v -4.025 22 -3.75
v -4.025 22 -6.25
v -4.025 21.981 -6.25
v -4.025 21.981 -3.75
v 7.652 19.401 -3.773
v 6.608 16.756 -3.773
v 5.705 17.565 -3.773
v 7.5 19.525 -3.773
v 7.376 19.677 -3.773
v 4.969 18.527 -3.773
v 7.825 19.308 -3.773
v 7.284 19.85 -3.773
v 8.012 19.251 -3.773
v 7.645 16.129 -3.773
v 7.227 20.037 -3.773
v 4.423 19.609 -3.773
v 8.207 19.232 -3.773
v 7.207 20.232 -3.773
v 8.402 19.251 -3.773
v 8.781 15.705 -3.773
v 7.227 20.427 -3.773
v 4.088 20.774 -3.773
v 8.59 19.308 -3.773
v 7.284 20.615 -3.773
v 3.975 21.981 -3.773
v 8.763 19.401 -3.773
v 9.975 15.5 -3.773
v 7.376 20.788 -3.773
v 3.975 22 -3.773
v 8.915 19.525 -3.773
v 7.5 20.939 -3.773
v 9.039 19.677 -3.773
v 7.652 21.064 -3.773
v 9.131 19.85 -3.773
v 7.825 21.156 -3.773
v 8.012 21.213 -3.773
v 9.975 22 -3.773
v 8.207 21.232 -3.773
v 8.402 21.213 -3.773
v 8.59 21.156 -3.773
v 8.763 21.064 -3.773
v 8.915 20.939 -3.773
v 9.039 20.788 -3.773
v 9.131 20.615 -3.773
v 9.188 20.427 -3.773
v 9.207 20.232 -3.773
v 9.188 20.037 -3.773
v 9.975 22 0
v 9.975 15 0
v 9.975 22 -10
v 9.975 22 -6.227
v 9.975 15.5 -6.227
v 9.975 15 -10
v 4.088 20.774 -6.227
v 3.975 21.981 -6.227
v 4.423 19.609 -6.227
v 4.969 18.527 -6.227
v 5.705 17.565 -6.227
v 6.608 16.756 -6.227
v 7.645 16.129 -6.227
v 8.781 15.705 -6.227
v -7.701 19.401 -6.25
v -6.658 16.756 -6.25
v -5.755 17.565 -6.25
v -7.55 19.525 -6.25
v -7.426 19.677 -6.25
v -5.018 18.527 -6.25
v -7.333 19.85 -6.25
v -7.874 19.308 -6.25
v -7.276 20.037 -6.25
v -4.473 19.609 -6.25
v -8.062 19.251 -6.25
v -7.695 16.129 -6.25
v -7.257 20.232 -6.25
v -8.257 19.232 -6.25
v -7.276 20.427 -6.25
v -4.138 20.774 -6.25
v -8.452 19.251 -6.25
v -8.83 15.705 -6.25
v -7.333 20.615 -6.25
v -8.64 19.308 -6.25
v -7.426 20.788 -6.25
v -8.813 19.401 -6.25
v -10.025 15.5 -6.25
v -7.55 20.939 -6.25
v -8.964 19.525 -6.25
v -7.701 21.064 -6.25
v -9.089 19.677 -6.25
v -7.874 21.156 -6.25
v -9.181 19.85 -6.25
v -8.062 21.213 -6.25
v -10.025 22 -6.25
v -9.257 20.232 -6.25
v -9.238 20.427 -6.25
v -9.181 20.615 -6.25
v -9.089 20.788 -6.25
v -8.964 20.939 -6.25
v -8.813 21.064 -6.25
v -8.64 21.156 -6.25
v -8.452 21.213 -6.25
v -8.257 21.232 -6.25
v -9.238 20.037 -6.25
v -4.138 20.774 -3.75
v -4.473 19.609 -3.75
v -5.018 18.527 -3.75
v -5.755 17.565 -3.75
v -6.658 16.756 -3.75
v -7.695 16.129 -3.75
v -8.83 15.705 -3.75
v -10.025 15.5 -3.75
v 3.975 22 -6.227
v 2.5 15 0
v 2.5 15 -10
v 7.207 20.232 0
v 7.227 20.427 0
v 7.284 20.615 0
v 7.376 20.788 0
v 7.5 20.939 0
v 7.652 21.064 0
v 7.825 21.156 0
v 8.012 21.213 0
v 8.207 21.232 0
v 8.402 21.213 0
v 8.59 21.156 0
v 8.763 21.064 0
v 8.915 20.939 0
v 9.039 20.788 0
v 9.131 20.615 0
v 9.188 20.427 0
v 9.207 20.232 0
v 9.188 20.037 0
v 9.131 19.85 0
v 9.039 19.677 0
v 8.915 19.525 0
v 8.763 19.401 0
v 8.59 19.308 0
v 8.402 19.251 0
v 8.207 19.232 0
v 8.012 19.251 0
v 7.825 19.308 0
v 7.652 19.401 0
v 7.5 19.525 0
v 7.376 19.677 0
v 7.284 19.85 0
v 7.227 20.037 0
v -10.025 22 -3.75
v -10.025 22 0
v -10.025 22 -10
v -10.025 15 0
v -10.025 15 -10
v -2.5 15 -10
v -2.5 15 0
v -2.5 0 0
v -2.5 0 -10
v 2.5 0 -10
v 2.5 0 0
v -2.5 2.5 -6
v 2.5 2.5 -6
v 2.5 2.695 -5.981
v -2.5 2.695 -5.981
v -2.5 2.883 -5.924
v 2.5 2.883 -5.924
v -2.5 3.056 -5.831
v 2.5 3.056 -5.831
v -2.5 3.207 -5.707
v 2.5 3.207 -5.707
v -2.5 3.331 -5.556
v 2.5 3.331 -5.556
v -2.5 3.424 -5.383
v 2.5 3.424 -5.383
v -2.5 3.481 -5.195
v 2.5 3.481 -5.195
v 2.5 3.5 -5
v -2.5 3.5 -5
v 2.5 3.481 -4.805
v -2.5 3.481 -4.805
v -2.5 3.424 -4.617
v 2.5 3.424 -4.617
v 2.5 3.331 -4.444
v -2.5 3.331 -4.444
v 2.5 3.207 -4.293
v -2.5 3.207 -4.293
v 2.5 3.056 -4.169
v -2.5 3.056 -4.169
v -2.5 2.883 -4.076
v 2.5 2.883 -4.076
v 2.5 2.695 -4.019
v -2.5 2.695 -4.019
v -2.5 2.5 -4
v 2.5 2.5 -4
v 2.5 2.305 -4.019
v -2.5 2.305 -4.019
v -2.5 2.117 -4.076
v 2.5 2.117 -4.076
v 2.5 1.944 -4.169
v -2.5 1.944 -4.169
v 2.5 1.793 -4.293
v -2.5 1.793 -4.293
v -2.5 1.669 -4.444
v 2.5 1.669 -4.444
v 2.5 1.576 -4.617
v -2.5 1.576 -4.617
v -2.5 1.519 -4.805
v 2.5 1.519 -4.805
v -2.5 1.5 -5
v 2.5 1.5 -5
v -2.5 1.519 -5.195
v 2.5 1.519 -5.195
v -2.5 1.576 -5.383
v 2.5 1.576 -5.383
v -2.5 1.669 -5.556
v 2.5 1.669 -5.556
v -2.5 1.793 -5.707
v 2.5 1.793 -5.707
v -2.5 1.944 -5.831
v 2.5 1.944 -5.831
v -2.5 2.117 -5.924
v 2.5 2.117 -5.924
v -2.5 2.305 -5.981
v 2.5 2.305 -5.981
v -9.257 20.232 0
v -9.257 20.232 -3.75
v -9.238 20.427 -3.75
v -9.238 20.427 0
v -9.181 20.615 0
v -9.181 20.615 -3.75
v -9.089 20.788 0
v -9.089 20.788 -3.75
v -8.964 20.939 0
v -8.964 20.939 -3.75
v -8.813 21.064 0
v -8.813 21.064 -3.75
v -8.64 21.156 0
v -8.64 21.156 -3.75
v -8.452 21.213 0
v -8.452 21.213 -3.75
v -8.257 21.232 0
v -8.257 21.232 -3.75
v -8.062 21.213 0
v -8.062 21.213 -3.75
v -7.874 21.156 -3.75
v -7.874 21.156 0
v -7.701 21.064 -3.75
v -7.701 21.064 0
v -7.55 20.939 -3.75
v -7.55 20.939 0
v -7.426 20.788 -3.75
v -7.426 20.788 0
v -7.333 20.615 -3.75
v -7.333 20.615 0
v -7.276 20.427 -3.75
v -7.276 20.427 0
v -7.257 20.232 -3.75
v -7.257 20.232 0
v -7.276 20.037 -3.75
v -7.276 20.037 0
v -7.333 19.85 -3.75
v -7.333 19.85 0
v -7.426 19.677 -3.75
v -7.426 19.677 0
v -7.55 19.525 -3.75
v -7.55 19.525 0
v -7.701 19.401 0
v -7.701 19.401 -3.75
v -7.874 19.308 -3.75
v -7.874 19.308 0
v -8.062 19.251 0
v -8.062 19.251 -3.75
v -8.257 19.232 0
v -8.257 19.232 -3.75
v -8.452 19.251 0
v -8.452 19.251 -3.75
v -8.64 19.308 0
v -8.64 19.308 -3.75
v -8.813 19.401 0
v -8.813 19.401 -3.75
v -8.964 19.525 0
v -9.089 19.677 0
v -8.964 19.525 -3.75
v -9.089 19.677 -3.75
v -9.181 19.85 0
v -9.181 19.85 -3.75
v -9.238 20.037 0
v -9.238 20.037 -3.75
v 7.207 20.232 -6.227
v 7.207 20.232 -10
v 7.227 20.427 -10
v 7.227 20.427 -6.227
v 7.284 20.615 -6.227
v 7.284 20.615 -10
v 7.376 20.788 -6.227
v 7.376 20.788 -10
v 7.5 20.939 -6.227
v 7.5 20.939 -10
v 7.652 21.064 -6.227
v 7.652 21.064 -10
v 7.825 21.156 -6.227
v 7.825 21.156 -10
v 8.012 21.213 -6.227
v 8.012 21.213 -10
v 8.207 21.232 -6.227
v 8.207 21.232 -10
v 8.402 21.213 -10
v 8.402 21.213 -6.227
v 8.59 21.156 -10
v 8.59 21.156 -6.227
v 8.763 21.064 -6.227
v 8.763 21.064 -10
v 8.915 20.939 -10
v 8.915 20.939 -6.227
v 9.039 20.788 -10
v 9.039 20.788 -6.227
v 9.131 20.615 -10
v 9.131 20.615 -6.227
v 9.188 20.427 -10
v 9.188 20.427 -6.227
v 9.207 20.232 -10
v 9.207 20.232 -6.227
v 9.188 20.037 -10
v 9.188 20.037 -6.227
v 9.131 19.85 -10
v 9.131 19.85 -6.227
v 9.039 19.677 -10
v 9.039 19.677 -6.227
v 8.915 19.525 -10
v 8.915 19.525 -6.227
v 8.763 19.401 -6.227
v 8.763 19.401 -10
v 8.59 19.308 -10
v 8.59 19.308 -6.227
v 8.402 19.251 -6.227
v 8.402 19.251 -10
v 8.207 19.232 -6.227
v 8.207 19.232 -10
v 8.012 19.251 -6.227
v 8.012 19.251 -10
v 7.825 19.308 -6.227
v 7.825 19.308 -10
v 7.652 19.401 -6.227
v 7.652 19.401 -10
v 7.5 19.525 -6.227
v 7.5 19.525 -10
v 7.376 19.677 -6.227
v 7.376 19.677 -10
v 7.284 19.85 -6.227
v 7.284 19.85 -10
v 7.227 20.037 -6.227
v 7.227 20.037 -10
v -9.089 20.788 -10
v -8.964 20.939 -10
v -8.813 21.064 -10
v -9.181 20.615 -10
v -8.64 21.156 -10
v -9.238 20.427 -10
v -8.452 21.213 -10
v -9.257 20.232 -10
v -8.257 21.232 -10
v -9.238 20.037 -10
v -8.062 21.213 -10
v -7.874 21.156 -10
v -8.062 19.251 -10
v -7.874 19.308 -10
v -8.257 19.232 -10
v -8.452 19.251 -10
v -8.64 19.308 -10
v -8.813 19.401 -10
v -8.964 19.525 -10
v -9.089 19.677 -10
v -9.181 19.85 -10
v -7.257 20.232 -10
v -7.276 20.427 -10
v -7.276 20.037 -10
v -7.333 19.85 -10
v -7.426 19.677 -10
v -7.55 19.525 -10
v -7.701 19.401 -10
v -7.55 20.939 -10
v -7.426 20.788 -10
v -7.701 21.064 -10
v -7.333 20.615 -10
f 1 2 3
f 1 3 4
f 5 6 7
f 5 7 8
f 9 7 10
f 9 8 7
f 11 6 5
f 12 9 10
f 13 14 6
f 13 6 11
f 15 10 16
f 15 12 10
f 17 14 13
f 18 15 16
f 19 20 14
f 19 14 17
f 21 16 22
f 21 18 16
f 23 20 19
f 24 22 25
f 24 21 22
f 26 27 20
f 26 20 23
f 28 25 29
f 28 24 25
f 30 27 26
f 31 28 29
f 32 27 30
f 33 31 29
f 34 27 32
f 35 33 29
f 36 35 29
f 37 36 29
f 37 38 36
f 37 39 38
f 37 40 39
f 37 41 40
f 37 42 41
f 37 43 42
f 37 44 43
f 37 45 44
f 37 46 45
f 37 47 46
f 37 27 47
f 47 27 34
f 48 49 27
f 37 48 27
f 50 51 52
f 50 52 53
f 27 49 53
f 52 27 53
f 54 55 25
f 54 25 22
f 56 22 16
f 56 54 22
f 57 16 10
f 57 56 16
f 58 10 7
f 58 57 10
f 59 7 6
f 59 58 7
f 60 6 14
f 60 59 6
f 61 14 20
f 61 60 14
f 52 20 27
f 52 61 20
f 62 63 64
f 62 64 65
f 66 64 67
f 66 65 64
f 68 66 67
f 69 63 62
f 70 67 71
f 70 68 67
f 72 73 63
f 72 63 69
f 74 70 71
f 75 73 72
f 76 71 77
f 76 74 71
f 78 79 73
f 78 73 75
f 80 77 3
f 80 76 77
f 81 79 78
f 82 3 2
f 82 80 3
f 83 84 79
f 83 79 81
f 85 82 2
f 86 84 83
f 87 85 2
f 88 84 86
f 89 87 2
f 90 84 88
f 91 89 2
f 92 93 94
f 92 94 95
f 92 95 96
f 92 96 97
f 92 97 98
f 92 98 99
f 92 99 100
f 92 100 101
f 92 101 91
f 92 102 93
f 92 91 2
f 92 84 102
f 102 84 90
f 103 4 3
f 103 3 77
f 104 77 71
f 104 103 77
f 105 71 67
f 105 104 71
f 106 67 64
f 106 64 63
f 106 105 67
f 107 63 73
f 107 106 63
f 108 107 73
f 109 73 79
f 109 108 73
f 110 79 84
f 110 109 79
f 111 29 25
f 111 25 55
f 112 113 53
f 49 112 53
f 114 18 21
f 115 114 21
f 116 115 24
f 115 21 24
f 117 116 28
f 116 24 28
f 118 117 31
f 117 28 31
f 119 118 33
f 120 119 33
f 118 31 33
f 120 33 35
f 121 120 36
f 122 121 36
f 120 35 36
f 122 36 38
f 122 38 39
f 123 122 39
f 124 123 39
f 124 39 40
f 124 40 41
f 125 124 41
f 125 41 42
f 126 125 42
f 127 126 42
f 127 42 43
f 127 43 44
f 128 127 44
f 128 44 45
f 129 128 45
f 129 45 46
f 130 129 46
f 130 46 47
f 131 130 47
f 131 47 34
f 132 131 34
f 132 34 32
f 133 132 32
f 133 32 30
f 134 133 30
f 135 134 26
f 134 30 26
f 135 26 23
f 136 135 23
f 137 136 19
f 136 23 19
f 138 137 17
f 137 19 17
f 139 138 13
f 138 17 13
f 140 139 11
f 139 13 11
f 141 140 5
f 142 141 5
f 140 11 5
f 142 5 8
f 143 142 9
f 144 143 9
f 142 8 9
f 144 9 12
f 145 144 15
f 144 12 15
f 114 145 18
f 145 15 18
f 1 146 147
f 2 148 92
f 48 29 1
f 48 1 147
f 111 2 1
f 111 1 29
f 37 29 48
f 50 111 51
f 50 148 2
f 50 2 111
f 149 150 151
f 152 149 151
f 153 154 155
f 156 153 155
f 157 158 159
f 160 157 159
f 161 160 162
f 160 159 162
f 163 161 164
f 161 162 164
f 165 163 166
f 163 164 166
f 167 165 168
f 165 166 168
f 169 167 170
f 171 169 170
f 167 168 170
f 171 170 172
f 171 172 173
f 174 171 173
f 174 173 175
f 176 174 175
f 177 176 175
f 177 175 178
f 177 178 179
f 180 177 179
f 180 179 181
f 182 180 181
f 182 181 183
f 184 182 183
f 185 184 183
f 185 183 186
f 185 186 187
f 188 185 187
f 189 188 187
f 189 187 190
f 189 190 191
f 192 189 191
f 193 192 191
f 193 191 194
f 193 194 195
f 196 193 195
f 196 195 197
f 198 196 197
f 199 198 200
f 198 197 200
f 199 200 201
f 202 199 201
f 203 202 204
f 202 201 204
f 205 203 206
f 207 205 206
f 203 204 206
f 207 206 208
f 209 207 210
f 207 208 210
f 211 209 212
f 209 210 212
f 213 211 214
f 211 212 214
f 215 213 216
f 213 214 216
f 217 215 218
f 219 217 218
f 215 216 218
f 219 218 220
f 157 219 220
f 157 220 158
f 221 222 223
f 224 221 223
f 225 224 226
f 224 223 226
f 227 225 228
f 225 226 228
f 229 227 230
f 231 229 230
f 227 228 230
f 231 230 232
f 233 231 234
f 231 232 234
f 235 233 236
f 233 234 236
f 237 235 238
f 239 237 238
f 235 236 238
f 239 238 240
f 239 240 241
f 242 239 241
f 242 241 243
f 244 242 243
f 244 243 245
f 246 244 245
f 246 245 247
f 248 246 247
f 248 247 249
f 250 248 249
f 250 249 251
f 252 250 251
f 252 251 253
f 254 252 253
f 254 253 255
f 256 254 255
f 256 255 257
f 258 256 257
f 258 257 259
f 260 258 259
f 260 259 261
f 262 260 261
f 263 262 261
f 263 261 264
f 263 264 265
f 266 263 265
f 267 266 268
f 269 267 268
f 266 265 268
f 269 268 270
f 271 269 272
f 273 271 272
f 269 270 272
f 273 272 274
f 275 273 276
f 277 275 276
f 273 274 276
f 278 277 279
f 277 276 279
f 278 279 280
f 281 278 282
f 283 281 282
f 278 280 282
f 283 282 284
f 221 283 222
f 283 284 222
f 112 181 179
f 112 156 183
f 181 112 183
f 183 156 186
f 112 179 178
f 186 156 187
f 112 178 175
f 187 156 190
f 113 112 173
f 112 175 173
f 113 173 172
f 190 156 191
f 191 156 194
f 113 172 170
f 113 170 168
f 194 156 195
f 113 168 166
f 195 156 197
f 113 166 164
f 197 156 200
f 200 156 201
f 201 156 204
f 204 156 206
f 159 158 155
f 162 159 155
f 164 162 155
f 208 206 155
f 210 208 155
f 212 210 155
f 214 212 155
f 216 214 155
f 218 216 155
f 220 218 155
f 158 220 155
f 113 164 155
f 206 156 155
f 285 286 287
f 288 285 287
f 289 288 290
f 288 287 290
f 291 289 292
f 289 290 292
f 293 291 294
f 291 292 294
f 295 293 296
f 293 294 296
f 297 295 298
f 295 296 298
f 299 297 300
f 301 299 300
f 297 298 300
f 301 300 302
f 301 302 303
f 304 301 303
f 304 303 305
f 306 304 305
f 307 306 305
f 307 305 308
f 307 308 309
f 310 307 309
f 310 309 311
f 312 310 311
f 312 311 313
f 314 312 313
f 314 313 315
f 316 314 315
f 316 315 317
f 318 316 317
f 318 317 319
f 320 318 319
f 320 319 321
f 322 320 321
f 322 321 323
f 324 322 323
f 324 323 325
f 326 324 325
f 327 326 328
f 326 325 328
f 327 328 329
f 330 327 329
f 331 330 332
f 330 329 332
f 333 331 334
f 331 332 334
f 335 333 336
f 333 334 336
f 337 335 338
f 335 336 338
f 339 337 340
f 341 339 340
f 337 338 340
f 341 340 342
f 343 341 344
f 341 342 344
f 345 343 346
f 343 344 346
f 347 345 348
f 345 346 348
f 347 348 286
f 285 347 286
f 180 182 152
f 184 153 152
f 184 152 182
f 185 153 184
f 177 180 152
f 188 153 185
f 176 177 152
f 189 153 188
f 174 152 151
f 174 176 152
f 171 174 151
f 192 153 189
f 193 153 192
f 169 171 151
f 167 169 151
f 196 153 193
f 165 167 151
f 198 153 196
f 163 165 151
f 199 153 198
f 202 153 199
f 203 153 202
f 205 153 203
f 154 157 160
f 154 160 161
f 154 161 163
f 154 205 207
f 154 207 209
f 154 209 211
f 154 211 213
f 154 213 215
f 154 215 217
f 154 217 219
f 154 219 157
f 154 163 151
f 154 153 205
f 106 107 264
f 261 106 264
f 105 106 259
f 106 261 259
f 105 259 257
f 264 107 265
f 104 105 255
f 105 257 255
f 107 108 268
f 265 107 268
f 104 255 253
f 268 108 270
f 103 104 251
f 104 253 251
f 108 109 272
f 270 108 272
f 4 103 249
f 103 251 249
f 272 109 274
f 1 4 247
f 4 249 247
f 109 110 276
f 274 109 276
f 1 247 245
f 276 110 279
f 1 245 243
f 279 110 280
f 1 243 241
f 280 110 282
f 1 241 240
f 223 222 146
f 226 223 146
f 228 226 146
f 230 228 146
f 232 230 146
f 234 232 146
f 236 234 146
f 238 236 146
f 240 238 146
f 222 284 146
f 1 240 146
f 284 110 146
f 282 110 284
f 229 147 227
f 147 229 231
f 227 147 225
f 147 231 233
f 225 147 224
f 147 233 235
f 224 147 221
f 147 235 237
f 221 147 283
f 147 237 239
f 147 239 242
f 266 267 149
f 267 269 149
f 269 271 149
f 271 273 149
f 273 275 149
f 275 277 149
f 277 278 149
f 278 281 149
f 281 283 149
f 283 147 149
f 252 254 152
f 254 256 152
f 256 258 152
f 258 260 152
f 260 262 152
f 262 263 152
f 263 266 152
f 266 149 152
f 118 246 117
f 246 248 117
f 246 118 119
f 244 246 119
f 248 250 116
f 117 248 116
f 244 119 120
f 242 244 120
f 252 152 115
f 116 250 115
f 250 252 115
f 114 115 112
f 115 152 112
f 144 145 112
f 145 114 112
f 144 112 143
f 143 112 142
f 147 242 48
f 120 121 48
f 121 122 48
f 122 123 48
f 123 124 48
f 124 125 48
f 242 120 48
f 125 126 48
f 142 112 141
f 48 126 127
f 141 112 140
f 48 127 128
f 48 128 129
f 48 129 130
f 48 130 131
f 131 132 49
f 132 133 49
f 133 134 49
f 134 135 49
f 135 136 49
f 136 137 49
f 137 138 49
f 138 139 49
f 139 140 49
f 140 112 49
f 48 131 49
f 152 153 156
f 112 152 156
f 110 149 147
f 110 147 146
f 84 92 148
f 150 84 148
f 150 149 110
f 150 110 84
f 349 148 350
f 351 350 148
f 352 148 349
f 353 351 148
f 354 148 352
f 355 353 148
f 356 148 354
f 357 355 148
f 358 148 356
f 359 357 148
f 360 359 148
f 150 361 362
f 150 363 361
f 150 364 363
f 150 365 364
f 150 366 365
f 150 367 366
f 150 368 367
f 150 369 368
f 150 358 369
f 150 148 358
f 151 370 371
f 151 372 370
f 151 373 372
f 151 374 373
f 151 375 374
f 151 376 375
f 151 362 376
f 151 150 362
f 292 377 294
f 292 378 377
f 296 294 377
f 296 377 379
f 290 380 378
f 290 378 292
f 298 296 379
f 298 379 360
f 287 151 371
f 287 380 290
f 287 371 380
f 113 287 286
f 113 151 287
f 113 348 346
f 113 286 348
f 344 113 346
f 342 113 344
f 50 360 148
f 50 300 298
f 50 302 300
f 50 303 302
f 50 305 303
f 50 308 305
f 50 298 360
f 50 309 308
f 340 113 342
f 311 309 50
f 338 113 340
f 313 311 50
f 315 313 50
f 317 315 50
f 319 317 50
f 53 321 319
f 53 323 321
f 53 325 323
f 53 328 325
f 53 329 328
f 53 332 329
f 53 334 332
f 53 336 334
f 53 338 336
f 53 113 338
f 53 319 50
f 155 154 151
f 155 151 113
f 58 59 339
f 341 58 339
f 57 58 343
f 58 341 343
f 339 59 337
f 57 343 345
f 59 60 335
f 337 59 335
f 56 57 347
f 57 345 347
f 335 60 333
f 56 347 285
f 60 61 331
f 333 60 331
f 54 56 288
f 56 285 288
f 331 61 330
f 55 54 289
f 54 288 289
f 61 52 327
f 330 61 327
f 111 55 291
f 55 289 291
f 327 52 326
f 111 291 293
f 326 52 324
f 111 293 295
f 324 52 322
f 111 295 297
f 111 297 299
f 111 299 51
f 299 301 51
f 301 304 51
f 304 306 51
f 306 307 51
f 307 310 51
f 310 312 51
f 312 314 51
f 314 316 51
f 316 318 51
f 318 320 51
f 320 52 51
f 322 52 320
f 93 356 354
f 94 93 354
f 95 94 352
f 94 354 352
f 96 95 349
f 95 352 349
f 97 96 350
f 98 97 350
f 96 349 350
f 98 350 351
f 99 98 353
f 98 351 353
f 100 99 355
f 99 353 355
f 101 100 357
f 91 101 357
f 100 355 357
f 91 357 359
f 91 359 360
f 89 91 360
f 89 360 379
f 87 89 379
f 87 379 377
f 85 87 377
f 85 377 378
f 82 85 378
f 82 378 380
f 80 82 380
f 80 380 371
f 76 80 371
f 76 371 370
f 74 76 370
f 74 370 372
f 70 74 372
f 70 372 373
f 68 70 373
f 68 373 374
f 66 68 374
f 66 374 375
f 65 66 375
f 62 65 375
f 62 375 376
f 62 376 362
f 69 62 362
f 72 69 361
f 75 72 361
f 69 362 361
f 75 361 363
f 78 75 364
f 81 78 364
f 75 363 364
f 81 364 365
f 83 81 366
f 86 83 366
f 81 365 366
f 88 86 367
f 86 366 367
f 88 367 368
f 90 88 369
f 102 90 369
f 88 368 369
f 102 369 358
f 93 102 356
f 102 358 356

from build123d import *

# Parameters (mm, degrees)
CROQUIS2_W              = 5
CROQUIS2_H              = 10
SALIENTE_EXTRUIR1_DEPTH = 15
CROQUIS3_R              = 1
CORTAR_EXTRUIR1_DEPTH   = 19.708286934
CROQUIS4_W              = 20
CROQUIS4_H              = 10
SALIENTE_EXTRUIR2_DEPTH = 7
CROQUIS5_W              = 2.5
CROQUIS5_H              = 6.5
CORTAR_EXTRUIR2_DEPTH   = 6
CROQUIS6_R              = 1
CORTAR_EXTRUIR3_DEPTH   = 27.162895312
CROQUIS7_W              = 2.453318502
CROQUIS7_H              = 6.5
CORTAR_EXTRUIR4_DEPTH   = 6
CROQUIS8_R              = 1
CORTAR_EXTRUIR5_DEPTH   = 27.162895312
REDONDEO1_R             = 6.5


with BuildPart() as part:
    # Croquis2 → Saliente-Extruir1 (new body)
    with BuildSketch(Plane(origin=(0, 0, 0), x_dir=(1, 0, 0), z_dir=(0, 1, 0))):
        with Locations((0, 5)):
            Rectangle(CROQUIS2_W, CROQUIS2_H)
    extrude(amount=SALIENTE_EXTRUIR1_DEPTH)

    # Croquis3 → Cortar-Extruir1 (cut, through all)
    with BuildSketch(Plane(origin=(2.5, 0, 0), x_dir=(0, 0, -1), z_dir=(1, 0, 0))):
        with Locations((5, 2.5)):
            Circle(CROQUIS3_R)
    extrude(amount=-CORTAR_EXTRUIR1_DEPTH, mode=Mode.SUBTRACT)

    # Croquis4 → Saliente-Extruir2 (add)
    with BuildSketch(Plane(origin=(0, 15, 0), x_dir=(1, 0, 0), z_dir=(0, 1, 0))):
        with Locations((-0.024823745, 5)):
            Rectangle(CROQUIS4_W, CROQUIS4_H)
    extrude(amount=SALIENTE_EXTRUIR2_DEPTH)

    # Croquis5 → Cortar-Extruir2 (cut)
    with BuildSketch(Plane.ZY.offset(10.024823745)):
        with Locations((-5, 18.75)):
            Rectangle(CROQUIS5_W, CROQUIS5_H)
    extrude(amount=-CORTAR_EXTRUIR2_DEPTH, mode=Mode.SUBTRACT)

    # Croquis6 → Cortar-Extruir3 (cut, through all)
    with BuildSketch(Plane(origin=(0, 0, -10), x_dir=(-1, 0, 0), z_dir=(0, 0, -1))):
        with Locations((8.257056792, 20.232233047)):
            Circle(CROQUIS6_R)
    extrude(amount=-CORTAR_EXTRUIR3_DEPTH, mode=Mode.SUBTRACT)

    # Croquis7 → Cortar-Extruir4 (cut)
    with BuildSketch(Plane(origin=(9.975176255, 0, 0), x_dir=(0, 0, -1), z_dir=(1, 0, 0))):
        with Locations((5, 18.75)):
            Rectangle(CROQUIS7_W, CROQUIS7_H)
    extrude(amount=-CORTAR_EXTRUIR4_DEPTH, mode=Mode.SUBTRACT)

    # Croquis8 → Cortar-Extruir5 (cut, through all)
    with BuildSketch(Plane(origin=(0, 0, -10), x_dir=(-1, 0, 0), z_dir=(0, 0, -1))):
        with Locations((-8.207409302, 20.232233047)):
            Circle(CROQUIS8_R)
    extrude(amount=-CORTAR_EXTRUIR5_DEPTH, mode=Mode.SUBTRACT)

    # Redondeo1
    # the kernel refuses this fillet: 6.5 mm, written as the material it adds along each edge
    with BuildSketch(Plane(origin=(-4.024823745, 15.5, -3.75), x_dir=(-1, 0, 0), z_dir=(0, 0, -1))) as redondeo1_piece_1:
        with BuildLine():
            CenterArc((6.5, 6.480740698), REDONDEO1_R, 180, 85.588274214)
            Line((0, 6.480740698), (-0.13, 6.480740698))
            Line((-0.13, 6.480740698), (-0.13, 0))
            Line((-0.13, 0), (0, -0.13))
            ThreePointArc((0, -0.13), (3, -0.13), (5.99, -0.129614814))
            Line((5.99, -0.129614814), (6, 0))
        make_face()
    extrude(amount=2.5)
    with BuildSketch(Plane(origin=(3.975176255, 15.5, -6.226659251), x_dir=(0, 1, 0), z_dir=(0, 0, 1))) as redondeo1_piece_2:
        with BuildLine():
            CenterArc((6.480740698, -6.5), REDONDEO1_R, 90, 85.588274214)
            Line((0, -6), (-0.129614814, -5.99))
            ThreePointArc((-0.129614814, -5.99), (-0.13, -3), (-0.13, 0))
            Line((-0.13, 0), (0, 0.13))
            Line((0, 0.13), (6.480740698, 0.13))
            Line((6.480740698, 0.13), (6.480740698, 0))
        make_face()
    extrude(amount=2.453318501)


solid = part.part
